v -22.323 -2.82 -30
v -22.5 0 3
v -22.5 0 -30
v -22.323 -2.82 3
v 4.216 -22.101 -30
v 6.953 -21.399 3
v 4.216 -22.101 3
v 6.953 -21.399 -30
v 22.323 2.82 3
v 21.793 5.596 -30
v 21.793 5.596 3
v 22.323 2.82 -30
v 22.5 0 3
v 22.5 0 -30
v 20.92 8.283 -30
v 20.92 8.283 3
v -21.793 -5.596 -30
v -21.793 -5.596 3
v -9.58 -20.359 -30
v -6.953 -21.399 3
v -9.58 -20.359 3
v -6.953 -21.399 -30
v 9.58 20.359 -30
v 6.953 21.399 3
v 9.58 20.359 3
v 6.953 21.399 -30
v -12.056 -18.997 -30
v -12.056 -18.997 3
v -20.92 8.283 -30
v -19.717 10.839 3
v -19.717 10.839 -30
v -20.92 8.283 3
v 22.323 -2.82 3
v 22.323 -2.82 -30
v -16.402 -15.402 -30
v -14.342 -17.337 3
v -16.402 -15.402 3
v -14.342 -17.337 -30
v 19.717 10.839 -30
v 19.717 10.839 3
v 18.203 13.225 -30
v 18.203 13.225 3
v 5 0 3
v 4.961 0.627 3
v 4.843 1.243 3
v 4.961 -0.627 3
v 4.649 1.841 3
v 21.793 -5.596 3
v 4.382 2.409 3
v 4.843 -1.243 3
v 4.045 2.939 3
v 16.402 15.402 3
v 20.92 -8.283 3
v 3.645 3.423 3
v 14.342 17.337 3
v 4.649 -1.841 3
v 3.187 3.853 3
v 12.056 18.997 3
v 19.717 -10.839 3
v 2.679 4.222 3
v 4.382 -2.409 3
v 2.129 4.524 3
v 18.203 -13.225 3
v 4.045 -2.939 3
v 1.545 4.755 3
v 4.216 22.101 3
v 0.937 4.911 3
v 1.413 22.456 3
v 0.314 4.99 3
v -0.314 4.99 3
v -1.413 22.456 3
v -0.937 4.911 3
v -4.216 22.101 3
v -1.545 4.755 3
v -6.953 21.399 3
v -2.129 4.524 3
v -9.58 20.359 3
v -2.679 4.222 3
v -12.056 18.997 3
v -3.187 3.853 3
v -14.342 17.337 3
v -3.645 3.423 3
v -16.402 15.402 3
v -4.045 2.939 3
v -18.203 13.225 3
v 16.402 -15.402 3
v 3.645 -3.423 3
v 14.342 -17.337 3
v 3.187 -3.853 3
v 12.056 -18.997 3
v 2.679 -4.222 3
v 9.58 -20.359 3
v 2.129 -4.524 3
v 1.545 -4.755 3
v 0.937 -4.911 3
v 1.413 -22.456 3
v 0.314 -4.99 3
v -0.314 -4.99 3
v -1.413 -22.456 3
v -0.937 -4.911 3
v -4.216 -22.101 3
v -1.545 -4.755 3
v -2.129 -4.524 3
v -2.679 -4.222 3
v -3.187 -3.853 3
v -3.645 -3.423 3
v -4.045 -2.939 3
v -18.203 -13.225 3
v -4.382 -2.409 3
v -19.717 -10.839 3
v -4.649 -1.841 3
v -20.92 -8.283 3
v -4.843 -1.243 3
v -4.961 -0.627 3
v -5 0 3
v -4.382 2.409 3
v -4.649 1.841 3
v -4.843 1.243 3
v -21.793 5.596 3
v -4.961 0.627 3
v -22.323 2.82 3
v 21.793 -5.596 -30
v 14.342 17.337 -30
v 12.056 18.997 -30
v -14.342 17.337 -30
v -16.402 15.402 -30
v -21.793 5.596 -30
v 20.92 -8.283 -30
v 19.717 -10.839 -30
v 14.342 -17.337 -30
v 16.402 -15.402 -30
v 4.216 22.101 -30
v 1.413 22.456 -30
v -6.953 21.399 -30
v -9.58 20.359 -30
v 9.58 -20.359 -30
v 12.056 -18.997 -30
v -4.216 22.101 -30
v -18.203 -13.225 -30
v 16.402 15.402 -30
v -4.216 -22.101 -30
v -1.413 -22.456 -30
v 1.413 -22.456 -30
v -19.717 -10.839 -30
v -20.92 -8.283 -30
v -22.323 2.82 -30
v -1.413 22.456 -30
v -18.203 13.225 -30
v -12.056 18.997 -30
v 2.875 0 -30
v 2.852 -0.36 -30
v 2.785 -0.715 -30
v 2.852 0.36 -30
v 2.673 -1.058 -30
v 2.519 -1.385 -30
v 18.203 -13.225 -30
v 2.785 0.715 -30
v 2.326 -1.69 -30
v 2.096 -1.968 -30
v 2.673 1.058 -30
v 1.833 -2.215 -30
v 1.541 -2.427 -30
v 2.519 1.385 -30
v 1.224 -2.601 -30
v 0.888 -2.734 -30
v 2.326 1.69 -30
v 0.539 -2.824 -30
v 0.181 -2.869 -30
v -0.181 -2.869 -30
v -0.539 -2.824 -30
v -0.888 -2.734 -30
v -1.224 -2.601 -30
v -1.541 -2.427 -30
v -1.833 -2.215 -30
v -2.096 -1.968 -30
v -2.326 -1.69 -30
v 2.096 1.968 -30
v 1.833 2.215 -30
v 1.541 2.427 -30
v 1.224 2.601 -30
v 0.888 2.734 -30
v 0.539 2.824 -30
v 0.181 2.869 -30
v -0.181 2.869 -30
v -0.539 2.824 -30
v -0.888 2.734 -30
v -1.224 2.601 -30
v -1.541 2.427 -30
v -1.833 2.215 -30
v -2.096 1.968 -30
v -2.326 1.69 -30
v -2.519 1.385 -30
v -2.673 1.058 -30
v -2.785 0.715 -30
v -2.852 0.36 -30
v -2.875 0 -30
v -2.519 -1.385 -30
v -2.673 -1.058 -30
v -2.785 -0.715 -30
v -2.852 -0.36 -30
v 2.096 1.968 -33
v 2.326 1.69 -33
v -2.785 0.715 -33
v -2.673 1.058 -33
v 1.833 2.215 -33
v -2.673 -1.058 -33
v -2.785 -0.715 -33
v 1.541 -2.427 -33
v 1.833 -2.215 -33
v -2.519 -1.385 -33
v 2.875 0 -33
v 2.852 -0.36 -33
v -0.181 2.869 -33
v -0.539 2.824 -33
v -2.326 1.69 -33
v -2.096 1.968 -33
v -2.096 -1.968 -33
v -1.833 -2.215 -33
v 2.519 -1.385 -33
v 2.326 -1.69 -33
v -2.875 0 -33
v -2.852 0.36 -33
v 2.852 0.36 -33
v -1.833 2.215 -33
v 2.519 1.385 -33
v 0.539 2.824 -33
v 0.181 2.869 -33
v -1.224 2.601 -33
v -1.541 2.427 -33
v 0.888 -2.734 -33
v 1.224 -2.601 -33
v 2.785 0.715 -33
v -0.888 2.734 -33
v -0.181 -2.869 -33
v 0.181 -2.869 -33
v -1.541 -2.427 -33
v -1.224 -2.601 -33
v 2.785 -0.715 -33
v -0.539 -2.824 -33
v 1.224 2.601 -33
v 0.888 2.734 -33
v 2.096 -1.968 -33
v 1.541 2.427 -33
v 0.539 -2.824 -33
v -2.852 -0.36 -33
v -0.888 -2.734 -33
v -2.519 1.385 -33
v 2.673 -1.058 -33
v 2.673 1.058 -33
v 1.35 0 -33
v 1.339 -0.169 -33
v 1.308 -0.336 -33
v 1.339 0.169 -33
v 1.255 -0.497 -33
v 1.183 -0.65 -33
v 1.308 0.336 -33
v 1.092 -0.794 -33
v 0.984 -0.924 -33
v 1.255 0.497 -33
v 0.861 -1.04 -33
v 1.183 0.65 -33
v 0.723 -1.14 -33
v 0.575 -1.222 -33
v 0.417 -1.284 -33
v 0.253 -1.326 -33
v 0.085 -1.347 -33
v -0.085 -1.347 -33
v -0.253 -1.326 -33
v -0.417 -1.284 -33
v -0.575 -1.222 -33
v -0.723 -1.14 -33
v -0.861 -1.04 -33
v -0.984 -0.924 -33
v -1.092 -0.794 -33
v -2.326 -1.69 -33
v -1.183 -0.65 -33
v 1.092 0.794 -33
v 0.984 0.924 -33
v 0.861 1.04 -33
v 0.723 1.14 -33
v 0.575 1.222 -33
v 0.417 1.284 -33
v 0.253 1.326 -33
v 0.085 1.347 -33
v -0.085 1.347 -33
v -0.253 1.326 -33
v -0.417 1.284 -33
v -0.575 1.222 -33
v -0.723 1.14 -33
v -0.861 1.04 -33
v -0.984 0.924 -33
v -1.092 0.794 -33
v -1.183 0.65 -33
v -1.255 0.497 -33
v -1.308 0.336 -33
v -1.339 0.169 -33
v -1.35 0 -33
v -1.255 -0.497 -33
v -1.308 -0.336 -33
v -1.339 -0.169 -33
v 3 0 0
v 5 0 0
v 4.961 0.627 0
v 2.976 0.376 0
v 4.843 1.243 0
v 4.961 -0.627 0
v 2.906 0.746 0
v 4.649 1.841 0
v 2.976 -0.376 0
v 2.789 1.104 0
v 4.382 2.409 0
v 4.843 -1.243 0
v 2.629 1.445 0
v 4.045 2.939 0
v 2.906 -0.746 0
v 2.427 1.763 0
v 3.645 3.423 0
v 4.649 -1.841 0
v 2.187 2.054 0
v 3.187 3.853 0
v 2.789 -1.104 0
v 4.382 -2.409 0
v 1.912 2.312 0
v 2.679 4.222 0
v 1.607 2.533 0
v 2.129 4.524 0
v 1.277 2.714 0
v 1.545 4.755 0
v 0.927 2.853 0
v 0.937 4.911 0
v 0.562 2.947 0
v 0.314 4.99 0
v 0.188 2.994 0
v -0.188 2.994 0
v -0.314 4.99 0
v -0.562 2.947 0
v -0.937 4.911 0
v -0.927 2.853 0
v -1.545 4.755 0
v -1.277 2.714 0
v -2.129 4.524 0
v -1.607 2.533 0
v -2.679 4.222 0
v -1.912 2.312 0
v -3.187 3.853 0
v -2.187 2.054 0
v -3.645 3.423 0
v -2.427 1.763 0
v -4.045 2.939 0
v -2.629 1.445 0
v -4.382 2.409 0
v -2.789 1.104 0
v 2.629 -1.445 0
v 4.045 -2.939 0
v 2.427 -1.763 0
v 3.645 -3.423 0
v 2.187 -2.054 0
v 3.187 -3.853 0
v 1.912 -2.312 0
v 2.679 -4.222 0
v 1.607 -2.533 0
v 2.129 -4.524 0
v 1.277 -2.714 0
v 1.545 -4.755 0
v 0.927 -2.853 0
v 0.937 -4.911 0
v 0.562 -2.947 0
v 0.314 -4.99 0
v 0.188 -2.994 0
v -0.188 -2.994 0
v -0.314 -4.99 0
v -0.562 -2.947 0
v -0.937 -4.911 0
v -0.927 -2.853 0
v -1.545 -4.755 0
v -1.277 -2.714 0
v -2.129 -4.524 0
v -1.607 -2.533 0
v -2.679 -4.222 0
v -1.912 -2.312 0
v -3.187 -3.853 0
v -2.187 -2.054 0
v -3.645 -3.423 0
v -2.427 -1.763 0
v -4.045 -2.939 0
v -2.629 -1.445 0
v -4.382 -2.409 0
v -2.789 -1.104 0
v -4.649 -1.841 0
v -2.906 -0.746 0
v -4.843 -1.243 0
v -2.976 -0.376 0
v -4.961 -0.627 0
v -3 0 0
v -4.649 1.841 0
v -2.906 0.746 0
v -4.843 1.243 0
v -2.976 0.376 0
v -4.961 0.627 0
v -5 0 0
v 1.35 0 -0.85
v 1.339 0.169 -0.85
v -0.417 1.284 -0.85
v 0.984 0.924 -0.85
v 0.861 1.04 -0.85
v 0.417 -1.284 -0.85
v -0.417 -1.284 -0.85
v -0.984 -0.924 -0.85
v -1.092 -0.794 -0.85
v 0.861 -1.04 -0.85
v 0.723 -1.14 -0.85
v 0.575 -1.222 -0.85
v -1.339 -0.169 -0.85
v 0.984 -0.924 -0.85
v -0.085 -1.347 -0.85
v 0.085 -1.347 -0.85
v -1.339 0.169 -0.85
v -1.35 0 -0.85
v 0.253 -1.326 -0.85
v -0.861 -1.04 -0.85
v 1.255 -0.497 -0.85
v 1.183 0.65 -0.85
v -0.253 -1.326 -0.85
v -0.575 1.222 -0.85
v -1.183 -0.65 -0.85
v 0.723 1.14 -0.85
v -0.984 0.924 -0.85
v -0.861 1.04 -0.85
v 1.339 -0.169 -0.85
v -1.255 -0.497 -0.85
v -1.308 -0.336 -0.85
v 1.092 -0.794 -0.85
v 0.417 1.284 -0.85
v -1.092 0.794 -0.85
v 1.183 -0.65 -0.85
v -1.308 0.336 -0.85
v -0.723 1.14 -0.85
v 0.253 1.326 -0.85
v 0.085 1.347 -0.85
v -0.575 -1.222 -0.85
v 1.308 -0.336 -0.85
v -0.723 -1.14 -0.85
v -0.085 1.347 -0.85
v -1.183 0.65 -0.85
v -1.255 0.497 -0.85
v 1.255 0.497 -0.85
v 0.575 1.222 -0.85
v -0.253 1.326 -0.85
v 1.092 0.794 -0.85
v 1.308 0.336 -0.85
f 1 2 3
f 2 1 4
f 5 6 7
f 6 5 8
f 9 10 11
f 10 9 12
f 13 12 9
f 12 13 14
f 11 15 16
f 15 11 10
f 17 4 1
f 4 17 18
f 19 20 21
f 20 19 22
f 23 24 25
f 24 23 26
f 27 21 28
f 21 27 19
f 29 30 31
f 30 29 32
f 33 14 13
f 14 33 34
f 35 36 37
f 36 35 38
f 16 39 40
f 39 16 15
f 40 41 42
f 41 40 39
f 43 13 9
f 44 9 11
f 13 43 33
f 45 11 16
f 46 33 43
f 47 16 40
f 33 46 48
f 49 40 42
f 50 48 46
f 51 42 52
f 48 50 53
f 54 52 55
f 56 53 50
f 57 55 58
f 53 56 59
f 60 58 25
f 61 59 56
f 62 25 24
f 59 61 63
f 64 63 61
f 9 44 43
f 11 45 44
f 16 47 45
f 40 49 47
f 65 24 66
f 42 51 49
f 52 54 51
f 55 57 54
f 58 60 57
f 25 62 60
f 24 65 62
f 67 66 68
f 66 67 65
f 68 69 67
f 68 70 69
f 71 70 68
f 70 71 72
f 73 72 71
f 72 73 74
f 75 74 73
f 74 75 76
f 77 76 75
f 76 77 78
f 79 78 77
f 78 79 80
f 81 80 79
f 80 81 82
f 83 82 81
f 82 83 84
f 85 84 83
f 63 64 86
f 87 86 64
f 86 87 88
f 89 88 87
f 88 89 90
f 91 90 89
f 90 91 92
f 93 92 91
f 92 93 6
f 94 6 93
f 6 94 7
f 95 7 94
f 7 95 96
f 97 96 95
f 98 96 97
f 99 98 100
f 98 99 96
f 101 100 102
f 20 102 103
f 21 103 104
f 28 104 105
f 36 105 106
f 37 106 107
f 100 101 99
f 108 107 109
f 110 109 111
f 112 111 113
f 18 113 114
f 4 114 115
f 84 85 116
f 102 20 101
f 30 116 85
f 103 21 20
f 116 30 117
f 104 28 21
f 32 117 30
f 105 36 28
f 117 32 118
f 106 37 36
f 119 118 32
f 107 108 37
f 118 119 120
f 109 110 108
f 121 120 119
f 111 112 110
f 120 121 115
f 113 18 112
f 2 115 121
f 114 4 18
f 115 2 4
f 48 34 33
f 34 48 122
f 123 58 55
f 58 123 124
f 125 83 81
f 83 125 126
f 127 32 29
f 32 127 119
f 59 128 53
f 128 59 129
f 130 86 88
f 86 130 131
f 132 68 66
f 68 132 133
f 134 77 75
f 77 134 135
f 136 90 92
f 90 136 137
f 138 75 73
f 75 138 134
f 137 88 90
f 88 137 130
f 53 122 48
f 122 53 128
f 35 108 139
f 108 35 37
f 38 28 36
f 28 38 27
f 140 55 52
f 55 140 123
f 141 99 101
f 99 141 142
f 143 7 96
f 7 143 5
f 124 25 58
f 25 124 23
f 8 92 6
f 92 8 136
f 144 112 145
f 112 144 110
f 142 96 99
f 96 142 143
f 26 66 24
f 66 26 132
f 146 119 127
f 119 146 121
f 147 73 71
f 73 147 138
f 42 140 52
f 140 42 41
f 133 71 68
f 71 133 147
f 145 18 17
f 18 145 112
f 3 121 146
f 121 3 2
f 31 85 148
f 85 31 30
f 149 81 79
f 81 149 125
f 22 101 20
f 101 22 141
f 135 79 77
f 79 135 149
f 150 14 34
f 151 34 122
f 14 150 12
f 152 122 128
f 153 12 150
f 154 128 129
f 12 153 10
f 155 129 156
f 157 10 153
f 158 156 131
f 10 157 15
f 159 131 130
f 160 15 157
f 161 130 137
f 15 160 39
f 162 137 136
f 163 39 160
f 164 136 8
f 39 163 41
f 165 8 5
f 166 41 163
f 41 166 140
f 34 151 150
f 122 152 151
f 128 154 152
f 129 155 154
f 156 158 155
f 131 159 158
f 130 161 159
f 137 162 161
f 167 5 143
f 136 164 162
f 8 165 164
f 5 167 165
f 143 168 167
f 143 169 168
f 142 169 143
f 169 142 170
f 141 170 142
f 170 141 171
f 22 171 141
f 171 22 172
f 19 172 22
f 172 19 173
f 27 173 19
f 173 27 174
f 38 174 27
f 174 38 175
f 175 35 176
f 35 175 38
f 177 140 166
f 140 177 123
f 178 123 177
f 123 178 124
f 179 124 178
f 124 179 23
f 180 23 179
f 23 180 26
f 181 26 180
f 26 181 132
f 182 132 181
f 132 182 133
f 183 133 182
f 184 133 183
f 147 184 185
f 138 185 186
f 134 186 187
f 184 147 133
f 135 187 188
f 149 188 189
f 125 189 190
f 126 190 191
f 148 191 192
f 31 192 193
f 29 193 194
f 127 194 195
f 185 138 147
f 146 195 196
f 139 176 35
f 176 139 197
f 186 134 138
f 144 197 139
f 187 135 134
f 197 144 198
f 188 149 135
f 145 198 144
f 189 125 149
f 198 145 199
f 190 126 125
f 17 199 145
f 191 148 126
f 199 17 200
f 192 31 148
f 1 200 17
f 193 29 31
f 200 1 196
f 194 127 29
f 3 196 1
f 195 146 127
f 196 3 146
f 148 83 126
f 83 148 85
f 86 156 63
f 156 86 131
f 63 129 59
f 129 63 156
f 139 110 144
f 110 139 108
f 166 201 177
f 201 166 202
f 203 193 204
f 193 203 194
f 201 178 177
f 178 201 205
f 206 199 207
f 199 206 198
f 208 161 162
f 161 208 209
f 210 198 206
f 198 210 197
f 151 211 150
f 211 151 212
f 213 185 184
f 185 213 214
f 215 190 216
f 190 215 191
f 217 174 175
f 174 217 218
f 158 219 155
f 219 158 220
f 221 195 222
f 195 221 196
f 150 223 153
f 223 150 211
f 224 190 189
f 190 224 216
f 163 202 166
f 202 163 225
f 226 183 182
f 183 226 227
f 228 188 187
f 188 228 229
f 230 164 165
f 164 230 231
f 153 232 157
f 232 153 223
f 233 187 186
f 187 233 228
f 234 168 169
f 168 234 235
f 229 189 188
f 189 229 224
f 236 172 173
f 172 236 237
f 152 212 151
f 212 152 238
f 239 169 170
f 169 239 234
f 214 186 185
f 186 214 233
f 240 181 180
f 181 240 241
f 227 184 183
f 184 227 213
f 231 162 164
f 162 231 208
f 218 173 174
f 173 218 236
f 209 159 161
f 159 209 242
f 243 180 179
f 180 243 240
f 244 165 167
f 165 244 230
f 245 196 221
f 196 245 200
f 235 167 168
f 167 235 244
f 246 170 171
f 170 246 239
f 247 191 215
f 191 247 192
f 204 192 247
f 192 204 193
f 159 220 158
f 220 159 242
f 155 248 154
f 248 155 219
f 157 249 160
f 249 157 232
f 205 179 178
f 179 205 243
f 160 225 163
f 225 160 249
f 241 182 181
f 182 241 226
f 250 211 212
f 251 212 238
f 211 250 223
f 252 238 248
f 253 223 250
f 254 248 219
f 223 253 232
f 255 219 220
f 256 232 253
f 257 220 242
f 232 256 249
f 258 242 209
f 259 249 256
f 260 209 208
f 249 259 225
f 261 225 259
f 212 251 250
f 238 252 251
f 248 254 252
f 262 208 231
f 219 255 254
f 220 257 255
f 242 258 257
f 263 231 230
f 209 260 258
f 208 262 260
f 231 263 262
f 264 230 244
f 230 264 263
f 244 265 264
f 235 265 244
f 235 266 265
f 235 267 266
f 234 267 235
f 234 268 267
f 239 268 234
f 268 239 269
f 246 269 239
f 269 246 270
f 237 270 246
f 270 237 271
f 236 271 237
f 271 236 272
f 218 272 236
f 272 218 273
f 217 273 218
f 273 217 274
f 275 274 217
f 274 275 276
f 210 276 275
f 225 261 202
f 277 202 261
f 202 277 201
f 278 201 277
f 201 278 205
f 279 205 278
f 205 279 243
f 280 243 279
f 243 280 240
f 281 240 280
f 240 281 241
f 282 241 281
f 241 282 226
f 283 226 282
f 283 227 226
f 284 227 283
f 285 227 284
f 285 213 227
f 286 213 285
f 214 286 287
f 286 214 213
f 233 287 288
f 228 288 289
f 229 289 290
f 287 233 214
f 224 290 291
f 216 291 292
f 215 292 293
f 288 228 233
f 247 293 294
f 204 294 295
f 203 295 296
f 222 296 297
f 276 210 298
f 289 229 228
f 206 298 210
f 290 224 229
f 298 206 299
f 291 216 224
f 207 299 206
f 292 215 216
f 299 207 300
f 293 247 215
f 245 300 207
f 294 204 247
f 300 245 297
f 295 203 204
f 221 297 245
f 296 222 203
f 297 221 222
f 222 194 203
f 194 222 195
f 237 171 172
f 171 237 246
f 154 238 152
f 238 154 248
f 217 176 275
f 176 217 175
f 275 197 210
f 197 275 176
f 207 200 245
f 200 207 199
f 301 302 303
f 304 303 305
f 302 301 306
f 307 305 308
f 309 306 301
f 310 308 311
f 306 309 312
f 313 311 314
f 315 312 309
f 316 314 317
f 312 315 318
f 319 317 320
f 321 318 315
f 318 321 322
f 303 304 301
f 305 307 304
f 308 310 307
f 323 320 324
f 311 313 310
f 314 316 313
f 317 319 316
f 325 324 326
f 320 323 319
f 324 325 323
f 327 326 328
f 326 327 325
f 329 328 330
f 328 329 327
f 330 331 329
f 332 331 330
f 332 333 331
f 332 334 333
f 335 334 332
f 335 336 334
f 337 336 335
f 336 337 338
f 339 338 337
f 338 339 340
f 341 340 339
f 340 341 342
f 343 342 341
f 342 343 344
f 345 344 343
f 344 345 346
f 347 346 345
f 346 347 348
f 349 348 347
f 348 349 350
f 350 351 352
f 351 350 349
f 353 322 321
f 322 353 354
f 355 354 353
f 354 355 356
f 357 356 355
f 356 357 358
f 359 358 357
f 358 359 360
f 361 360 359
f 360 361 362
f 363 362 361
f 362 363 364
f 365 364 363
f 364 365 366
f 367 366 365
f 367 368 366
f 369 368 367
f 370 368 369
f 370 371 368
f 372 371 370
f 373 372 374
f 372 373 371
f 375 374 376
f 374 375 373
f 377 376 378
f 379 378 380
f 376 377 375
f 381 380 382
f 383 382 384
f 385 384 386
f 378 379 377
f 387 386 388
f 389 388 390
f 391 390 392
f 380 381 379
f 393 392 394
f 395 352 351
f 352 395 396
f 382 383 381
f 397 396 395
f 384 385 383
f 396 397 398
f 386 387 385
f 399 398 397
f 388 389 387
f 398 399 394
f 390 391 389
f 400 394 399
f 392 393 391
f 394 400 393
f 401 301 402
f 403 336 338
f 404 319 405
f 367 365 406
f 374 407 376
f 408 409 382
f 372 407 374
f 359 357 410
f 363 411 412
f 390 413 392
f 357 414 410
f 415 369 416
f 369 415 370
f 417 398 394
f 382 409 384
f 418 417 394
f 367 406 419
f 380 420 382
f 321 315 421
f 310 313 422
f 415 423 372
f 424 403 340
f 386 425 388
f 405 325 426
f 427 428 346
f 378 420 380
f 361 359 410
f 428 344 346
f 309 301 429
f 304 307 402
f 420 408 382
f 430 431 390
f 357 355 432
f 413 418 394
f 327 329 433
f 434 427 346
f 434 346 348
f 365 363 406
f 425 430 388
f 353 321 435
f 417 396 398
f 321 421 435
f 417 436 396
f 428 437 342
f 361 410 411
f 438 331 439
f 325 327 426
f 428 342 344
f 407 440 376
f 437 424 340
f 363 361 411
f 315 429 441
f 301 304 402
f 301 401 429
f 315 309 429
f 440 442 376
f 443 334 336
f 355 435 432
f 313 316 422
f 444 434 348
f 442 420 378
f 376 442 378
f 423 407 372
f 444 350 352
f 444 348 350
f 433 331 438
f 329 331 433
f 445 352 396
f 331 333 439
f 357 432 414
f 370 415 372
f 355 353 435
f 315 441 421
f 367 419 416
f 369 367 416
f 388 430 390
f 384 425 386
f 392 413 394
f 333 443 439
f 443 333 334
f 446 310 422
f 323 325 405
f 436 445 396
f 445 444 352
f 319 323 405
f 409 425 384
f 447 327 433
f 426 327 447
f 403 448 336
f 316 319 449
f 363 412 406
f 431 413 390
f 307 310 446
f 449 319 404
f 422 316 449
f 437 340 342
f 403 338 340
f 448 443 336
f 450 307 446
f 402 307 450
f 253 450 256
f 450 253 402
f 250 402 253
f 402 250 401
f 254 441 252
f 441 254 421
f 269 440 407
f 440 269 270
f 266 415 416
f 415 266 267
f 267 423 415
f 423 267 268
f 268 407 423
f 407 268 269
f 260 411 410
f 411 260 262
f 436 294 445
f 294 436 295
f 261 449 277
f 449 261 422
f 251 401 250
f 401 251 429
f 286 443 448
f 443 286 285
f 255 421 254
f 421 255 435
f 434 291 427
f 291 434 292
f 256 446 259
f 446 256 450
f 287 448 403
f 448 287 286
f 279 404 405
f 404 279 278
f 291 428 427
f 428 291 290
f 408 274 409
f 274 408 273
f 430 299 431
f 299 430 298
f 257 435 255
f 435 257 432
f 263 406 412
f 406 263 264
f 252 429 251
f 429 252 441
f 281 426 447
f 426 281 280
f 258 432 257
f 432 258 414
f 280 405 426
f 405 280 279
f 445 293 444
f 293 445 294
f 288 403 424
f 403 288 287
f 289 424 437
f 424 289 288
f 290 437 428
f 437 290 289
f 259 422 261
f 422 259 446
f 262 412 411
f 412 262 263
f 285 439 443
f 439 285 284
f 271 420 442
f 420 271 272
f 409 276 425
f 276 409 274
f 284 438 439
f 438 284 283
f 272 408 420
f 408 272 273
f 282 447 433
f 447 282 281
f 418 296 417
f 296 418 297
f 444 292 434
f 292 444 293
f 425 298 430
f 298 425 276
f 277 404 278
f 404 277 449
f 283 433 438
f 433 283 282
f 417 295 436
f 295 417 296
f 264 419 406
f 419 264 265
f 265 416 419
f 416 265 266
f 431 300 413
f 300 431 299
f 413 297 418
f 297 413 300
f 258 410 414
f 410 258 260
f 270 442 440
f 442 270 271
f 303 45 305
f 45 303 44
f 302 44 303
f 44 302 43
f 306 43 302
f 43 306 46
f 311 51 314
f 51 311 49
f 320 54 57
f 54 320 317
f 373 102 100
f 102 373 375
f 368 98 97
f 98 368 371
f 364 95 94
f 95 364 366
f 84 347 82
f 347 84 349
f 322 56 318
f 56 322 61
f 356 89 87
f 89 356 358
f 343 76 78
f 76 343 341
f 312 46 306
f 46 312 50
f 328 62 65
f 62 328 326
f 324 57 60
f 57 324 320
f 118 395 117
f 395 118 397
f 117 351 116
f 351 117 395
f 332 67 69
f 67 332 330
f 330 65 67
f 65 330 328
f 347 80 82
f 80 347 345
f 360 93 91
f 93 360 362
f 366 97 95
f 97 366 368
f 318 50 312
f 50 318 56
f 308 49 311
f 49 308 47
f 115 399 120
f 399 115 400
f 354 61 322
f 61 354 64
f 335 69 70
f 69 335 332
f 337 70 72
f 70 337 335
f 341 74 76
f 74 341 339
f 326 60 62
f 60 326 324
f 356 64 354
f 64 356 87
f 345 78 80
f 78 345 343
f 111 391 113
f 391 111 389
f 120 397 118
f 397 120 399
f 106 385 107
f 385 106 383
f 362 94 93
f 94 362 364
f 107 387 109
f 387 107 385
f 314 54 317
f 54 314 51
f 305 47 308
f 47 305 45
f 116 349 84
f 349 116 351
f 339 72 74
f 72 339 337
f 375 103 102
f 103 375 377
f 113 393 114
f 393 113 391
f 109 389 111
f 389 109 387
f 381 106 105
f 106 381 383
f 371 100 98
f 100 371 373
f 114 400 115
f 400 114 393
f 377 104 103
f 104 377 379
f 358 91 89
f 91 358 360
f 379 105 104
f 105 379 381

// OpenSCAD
$fn = 50;

difference() {
	union() {
		translate(v = [0, 0, -30.0]) {
			cylinder(h = 33, r = 22.5);
		}
		#translate(v = [0, 0, -33.0]) {
			cylinder(h = 33, r = 2.875);
		}
	}
	union() {
		translate(v = [0, 0, 0]) {
			rotate(a = [0, 0, 0]) {
				difference() {
					union() {
						translate(v = [0, 0, -33.0]) {
							cylinder(h = 33, r = 1.0);
						}
						translate(v = [0, 0, -0.85]) {
							cylinder(h = 0.85, r1 = 1.35, r2 = 3.0);
						}
						translate(v = [0, 0, -33.0]) {
							cylinder(h = 33, r = 1.35);
						}
						translate(v = [0, 0, -33.0]) {
							cylinder(h = 33, r = 1.0);
						}
					}
					union();
				}
			}
		}
		#cylinder(h = 3, r = 5.0);
	}
}
